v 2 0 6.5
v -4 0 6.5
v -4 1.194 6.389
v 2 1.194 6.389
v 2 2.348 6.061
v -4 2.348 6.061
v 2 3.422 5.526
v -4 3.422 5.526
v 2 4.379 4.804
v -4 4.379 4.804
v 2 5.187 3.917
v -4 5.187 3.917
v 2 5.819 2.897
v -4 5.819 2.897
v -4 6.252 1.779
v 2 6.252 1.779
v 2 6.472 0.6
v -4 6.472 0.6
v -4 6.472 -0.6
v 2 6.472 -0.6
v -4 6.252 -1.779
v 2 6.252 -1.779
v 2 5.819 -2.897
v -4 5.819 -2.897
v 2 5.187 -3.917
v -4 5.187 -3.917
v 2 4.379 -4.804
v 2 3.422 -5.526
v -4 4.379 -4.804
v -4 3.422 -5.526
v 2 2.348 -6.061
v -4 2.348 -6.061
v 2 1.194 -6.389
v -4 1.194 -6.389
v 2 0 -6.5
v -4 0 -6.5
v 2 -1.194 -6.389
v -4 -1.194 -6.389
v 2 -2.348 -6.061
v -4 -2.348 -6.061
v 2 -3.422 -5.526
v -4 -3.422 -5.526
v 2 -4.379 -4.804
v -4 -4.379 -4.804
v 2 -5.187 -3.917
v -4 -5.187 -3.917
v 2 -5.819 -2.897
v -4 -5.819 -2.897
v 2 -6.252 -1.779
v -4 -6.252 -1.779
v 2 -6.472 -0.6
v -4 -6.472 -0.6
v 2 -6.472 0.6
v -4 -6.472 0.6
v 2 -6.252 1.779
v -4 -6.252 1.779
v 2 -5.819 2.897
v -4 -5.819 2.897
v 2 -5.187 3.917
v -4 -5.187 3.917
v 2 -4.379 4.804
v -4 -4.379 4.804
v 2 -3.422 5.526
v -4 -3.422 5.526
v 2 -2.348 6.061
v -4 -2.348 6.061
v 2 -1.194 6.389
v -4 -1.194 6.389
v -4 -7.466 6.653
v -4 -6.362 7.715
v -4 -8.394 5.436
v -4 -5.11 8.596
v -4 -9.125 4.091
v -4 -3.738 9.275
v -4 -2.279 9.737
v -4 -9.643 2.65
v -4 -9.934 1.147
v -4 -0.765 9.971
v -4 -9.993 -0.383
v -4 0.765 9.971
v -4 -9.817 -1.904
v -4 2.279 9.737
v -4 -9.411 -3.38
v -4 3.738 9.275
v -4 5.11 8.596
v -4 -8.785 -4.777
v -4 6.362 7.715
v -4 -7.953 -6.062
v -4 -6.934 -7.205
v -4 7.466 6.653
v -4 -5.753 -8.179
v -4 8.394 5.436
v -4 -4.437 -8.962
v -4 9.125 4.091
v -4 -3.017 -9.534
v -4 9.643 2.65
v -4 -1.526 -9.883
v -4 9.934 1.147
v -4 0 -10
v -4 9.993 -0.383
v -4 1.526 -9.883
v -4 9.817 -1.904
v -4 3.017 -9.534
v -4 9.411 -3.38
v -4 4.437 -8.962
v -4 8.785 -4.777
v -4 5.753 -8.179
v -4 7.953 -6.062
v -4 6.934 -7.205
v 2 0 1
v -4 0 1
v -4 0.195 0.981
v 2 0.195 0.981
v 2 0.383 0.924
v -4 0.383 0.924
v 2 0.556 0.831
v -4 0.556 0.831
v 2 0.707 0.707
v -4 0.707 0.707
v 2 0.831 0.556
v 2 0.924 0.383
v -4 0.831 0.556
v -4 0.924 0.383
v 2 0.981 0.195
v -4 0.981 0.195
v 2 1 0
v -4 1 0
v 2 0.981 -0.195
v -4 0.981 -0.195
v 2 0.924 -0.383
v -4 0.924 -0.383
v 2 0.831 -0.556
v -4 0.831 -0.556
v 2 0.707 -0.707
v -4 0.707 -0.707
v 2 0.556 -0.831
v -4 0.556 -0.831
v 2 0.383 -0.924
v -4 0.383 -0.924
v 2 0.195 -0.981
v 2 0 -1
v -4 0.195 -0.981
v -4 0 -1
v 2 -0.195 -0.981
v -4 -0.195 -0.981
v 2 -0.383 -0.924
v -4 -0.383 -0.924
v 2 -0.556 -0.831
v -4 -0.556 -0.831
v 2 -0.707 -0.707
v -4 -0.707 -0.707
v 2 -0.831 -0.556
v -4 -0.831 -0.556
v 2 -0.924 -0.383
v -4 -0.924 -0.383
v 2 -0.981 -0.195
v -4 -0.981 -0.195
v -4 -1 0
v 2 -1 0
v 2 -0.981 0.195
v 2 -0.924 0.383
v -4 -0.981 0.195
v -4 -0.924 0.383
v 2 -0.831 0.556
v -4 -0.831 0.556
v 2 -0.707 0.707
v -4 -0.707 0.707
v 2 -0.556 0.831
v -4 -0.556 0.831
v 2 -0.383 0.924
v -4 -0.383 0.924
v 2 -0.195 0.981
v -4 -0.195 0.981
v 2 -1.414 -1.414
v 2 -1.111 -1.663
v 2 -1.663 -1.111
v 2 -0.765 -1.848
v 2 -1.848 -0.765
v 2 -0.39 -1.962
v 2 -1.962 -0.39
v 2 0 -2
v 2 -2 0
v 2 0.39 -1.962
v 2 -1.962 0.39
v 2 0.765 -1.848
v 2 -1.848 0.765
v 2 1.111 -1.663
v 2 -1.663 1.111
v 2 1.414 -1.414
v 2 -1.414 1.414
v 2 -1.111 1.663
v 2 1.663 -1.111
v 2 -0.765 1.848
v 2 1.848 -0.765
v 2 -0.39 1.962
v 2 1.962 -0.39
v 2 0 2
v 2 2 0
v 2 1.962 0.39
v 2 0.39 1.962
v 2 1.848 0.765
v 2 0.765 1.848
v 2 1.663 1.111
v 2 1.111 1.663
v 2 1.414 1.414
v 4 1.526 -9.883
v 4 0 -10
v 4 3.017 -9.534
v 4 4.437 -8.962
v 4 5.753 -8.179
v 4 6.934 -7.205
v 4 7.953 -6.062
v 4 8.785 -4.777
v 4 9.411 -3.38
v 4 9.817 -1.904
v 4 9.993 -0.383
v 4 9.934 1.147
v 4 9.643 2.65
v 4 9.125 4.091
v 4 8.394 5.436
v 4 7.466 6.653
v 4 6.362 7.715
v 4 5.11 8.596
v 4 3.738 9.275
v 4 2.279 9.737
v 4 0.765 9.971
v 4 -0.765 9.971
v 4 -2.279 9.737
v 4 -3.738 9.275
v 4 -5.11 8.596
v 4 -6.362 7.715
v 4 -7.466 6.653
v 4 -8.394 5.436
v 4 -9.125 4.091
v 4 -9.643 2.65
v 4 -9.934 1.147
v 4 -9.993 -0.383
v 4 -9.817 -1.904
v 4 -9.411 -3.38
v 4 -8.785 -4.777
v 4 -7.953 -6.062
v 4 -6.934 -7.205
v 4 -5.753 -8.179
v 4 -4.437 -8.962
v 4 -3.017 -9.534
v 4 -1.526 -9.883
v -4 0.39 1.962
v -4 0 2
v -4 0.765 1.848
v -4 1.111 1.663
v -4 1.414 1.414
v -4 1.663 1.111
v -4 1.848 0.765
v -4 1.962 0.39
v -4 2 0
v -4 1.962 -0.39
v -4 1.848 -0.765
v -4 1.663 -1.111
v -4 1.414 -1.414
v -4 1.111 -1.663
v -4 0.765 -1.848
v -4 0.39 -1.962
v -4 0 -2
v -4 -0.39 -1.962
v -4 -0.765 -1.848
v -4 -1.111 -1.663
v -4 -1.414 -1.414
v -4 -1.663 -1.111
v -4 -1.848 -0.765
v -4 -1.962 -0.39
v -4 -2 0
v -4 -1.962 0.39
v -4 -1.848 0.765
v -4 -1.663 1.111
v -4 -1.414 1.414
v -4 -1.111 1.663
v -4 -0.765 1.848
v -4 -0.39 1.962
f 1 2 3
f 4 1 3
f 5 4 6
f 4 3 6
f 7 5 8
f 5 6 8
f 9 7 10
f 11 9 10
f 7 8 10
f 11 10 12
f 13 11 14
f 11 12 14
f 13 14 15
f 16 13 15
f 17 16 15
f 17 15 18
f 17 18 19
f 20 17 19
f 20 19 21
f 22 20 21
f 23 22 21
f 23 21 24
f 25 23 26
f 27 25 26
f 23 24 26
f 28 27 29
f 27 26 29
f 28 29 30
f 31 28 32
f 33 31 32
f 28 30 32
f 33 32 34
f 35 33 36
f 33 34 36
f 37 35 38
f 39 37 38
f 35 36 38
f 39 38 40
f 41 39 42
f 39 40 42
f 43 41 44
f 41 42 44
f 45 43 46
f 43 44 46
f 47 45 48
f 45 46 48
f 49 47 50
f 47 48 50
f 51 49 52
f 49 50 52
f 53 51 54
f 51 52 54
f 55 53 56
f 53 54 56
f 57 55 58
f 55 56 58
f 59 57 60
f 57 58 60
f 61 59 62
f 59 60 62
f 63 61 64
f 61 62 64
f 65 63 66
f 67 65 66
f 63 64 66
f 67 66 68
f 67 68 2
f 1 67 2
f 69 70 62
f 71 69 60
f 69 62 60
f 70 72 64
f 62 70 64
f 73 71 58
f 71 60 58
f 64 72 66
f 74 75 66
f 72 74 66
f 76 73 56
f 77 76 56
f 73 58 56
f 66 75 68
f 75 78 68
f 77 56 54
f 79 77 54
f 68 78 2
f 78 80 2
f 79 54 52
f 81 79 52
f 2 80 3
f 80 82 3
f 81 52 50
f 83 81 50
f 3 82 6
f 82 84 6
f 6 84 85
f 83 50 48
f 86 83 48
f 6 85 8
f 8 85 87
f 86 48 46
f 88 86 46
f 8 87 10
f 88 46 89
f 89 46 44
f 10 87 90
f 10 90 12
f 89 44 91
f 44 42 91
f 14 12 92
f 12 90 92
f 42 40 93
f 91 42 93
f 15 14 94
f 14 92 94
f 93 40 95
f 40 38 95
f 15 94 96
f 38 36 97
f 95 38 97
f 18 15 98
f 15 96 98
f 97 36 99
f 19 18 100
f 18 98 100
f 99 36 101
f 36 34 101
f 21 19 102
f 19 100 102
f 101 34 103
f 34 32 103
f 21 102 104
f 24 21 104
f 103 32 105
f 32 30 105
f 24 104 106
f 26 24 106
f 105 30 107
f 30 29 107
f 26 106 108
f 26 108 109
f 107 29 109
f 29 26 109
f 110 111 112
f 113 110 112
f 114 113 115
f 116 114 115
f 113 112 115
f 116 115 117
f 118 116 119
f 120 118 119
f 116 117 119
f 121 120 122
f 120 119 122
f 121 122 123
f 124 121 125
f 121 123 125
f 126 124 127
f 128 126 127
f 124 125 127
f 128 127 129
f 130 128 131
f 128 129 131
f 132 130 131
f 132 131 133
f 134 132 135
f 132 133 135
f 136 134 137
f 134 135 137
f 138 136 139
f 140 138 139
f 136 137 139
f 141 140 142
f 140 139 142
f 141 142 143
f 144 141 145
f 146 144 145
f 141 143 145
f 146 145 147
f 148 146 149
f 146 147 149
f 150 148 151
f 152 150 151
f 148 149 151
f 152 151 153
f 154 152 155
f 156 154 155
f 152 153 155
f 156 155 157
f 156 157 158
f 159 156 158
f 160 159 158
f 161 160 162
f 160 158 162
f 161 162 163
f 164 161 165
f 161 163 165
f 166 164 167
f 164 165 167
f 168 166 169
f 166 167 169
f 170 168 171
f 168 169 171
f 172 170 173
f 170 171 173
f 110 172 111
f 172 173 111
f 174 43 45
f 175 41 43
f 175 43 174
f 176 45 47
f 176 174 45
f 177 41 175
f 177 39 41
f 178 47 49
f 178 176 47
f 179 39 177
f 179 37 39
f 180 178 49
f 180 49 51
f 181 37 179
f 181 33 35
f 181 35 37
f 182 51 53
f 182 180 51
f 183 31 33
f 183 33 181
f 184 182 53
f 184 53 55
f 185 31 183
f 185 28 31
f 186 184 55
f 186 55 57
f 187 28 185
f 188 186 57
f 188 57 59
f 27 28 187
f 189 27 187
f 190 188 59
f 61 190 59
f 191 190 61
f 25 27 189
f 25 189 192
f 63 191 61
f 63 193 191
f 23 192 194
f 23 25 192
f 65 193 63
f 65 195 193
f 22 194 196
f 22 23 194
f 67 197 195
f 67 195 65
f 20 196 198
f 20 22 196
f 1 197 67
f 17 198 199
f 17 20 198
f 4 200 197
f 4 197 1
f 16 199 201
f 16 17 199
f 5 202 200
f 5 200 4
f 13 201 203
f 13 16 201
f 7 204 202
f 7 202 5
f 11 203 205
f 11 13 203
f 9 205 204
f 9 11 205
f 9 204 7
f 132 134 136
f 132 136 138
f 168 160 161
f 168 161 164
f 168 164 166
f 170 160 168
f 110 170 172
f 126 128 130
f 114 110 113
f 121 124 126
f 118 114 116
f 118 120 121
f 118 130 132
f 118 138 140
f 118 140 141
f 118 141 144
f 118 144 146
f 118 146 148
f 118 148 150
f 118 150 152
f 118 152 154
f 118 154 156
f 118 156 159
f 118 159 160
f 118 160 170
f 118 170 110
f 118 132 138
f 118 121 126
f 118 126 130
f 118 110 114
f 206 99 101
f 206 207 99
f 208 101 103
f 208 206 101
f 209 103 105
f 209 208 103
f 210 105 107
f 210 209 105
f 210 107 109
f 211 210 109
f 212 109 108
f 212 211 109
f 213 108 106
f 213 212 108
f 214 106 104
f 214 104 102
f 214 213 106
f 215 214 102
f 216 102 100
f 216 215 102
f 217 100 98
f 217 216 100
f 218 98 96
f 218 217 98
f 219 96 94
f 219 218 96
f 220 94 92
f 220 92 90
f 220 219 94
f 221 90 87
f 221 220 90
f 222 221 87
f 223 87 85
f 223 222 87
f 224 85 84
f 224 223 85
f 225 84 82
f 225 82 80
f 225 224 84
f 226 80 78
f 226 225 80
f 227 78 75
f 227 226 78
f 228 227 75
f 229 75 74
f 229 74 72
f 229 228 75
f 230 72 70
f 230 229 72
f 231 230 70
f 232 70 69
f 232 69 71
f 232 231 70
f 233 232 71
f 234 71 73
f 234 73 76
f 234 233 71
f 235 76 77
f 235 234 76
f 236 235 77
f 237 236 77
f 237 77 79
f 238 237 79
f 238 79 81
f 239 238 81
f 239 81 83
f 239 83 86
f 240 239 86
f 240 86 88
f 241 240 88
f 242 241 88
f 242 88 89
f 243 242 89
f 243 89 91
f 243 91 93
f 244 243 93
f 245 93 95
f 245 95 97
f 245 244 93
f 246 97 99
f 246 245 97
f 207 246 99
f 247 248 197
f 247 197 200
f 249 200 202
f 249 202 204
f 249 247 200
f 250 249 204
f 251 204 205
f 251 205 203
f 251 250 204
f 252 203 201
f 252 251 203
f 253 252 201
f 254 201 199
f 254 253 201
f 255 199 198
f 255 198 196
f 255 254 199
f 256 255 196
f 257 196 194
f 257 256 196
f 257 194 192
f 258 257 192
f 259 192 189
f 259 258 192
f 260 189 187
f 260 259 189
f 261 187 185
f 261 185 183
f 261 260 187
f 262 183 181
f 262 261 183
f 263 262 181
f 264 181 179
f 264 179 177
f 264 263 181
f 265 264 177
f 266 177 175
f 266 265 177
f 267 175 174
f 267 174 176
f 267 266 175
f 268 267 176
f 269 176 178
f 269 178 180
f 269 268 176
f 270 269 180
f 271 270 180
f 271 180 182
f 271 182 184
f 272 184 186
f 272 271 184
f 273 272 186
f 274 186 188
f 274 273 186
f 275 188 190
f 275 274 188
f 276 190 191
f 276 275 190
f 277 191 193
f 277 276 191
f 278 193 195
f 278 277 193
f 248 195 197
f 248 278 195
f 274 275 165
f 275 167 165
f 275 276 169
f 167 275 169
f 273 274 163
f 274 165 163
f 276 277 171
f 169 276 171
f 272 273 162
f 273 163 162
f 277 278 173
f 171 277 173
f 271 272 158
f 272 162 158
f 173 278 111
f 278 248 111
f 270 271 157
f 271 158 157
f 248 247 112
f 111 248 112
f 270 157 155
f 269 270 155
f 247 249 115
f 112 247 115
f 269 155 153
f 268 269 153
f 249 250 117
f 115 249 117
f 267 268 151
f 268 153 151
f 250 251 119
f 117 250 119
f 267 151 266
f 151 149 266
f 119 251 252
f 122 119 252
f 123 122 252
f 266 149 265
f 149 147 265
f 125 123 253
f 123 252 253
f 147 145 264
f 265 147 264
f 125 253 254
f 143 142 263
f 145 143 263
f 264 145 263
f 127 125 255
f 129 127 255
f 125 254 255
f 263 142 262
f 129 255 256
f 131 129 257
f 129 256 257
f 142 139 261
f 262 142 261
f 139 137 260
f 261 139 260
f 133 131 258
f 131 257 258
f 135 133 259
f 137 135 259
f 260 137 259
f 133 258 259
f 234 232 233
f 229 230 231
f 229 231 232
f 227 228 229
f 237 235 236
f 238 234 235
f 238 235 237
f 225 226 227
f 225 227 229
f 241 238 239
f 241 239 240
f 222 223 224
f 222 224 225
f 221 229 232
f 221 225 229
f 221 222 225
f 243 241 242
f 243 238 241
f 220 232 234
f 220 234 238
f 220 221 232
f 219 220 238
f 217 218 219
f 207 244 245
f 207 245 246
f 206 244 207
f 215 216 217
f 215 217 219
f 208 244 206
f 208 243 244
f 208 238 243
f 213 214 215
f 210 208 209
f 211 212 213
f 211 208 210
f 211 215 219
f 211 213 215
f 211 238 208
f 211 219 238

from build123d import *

# Parameters (mm, degrees)
SKETCH_1_R          = 10
EXTRUDE_1_DEPTH     = 4
SKETCH_2_R          = 6.5
SKETCH_2_R_2        = 2
SKETCH_2_R_3        = 1
CUT_EXTRUDE_1_DEPTH = 6


with BuildPart() as part:
    # 草图1 → 凸台-拉伸1 (new, symmetric)
    with BuildSketch(Plane(origin=(0, 0, 0), x_dir=(0, 0, -1), z_dir=(1, 0, 0))):
        Circle(SKETCH_1_R)
    extrude(amount=EXTRUDE_1_DEPTH, both=True)

    # 草图2 → 切除-拉伸1 (cut)
    # profile 1 of 2: a face of its own
    with BuildSketch(Plane.ZY.offset(4)):
        Circle(SKETCH_2_R)
        Circle(SKETCH_2_R_2, mode=Mode.SUBTRACT)
    # profile 2 of 2: a face of its own
    with BuildSketch(Plane.ZY.offset(4)):
        Circle(SKETCH_2_R_3)
    extrude(amount=-CUT_EXTRUDE_1_DEPTH, mode=Mode.SUBTRACT)


solid = part.part
